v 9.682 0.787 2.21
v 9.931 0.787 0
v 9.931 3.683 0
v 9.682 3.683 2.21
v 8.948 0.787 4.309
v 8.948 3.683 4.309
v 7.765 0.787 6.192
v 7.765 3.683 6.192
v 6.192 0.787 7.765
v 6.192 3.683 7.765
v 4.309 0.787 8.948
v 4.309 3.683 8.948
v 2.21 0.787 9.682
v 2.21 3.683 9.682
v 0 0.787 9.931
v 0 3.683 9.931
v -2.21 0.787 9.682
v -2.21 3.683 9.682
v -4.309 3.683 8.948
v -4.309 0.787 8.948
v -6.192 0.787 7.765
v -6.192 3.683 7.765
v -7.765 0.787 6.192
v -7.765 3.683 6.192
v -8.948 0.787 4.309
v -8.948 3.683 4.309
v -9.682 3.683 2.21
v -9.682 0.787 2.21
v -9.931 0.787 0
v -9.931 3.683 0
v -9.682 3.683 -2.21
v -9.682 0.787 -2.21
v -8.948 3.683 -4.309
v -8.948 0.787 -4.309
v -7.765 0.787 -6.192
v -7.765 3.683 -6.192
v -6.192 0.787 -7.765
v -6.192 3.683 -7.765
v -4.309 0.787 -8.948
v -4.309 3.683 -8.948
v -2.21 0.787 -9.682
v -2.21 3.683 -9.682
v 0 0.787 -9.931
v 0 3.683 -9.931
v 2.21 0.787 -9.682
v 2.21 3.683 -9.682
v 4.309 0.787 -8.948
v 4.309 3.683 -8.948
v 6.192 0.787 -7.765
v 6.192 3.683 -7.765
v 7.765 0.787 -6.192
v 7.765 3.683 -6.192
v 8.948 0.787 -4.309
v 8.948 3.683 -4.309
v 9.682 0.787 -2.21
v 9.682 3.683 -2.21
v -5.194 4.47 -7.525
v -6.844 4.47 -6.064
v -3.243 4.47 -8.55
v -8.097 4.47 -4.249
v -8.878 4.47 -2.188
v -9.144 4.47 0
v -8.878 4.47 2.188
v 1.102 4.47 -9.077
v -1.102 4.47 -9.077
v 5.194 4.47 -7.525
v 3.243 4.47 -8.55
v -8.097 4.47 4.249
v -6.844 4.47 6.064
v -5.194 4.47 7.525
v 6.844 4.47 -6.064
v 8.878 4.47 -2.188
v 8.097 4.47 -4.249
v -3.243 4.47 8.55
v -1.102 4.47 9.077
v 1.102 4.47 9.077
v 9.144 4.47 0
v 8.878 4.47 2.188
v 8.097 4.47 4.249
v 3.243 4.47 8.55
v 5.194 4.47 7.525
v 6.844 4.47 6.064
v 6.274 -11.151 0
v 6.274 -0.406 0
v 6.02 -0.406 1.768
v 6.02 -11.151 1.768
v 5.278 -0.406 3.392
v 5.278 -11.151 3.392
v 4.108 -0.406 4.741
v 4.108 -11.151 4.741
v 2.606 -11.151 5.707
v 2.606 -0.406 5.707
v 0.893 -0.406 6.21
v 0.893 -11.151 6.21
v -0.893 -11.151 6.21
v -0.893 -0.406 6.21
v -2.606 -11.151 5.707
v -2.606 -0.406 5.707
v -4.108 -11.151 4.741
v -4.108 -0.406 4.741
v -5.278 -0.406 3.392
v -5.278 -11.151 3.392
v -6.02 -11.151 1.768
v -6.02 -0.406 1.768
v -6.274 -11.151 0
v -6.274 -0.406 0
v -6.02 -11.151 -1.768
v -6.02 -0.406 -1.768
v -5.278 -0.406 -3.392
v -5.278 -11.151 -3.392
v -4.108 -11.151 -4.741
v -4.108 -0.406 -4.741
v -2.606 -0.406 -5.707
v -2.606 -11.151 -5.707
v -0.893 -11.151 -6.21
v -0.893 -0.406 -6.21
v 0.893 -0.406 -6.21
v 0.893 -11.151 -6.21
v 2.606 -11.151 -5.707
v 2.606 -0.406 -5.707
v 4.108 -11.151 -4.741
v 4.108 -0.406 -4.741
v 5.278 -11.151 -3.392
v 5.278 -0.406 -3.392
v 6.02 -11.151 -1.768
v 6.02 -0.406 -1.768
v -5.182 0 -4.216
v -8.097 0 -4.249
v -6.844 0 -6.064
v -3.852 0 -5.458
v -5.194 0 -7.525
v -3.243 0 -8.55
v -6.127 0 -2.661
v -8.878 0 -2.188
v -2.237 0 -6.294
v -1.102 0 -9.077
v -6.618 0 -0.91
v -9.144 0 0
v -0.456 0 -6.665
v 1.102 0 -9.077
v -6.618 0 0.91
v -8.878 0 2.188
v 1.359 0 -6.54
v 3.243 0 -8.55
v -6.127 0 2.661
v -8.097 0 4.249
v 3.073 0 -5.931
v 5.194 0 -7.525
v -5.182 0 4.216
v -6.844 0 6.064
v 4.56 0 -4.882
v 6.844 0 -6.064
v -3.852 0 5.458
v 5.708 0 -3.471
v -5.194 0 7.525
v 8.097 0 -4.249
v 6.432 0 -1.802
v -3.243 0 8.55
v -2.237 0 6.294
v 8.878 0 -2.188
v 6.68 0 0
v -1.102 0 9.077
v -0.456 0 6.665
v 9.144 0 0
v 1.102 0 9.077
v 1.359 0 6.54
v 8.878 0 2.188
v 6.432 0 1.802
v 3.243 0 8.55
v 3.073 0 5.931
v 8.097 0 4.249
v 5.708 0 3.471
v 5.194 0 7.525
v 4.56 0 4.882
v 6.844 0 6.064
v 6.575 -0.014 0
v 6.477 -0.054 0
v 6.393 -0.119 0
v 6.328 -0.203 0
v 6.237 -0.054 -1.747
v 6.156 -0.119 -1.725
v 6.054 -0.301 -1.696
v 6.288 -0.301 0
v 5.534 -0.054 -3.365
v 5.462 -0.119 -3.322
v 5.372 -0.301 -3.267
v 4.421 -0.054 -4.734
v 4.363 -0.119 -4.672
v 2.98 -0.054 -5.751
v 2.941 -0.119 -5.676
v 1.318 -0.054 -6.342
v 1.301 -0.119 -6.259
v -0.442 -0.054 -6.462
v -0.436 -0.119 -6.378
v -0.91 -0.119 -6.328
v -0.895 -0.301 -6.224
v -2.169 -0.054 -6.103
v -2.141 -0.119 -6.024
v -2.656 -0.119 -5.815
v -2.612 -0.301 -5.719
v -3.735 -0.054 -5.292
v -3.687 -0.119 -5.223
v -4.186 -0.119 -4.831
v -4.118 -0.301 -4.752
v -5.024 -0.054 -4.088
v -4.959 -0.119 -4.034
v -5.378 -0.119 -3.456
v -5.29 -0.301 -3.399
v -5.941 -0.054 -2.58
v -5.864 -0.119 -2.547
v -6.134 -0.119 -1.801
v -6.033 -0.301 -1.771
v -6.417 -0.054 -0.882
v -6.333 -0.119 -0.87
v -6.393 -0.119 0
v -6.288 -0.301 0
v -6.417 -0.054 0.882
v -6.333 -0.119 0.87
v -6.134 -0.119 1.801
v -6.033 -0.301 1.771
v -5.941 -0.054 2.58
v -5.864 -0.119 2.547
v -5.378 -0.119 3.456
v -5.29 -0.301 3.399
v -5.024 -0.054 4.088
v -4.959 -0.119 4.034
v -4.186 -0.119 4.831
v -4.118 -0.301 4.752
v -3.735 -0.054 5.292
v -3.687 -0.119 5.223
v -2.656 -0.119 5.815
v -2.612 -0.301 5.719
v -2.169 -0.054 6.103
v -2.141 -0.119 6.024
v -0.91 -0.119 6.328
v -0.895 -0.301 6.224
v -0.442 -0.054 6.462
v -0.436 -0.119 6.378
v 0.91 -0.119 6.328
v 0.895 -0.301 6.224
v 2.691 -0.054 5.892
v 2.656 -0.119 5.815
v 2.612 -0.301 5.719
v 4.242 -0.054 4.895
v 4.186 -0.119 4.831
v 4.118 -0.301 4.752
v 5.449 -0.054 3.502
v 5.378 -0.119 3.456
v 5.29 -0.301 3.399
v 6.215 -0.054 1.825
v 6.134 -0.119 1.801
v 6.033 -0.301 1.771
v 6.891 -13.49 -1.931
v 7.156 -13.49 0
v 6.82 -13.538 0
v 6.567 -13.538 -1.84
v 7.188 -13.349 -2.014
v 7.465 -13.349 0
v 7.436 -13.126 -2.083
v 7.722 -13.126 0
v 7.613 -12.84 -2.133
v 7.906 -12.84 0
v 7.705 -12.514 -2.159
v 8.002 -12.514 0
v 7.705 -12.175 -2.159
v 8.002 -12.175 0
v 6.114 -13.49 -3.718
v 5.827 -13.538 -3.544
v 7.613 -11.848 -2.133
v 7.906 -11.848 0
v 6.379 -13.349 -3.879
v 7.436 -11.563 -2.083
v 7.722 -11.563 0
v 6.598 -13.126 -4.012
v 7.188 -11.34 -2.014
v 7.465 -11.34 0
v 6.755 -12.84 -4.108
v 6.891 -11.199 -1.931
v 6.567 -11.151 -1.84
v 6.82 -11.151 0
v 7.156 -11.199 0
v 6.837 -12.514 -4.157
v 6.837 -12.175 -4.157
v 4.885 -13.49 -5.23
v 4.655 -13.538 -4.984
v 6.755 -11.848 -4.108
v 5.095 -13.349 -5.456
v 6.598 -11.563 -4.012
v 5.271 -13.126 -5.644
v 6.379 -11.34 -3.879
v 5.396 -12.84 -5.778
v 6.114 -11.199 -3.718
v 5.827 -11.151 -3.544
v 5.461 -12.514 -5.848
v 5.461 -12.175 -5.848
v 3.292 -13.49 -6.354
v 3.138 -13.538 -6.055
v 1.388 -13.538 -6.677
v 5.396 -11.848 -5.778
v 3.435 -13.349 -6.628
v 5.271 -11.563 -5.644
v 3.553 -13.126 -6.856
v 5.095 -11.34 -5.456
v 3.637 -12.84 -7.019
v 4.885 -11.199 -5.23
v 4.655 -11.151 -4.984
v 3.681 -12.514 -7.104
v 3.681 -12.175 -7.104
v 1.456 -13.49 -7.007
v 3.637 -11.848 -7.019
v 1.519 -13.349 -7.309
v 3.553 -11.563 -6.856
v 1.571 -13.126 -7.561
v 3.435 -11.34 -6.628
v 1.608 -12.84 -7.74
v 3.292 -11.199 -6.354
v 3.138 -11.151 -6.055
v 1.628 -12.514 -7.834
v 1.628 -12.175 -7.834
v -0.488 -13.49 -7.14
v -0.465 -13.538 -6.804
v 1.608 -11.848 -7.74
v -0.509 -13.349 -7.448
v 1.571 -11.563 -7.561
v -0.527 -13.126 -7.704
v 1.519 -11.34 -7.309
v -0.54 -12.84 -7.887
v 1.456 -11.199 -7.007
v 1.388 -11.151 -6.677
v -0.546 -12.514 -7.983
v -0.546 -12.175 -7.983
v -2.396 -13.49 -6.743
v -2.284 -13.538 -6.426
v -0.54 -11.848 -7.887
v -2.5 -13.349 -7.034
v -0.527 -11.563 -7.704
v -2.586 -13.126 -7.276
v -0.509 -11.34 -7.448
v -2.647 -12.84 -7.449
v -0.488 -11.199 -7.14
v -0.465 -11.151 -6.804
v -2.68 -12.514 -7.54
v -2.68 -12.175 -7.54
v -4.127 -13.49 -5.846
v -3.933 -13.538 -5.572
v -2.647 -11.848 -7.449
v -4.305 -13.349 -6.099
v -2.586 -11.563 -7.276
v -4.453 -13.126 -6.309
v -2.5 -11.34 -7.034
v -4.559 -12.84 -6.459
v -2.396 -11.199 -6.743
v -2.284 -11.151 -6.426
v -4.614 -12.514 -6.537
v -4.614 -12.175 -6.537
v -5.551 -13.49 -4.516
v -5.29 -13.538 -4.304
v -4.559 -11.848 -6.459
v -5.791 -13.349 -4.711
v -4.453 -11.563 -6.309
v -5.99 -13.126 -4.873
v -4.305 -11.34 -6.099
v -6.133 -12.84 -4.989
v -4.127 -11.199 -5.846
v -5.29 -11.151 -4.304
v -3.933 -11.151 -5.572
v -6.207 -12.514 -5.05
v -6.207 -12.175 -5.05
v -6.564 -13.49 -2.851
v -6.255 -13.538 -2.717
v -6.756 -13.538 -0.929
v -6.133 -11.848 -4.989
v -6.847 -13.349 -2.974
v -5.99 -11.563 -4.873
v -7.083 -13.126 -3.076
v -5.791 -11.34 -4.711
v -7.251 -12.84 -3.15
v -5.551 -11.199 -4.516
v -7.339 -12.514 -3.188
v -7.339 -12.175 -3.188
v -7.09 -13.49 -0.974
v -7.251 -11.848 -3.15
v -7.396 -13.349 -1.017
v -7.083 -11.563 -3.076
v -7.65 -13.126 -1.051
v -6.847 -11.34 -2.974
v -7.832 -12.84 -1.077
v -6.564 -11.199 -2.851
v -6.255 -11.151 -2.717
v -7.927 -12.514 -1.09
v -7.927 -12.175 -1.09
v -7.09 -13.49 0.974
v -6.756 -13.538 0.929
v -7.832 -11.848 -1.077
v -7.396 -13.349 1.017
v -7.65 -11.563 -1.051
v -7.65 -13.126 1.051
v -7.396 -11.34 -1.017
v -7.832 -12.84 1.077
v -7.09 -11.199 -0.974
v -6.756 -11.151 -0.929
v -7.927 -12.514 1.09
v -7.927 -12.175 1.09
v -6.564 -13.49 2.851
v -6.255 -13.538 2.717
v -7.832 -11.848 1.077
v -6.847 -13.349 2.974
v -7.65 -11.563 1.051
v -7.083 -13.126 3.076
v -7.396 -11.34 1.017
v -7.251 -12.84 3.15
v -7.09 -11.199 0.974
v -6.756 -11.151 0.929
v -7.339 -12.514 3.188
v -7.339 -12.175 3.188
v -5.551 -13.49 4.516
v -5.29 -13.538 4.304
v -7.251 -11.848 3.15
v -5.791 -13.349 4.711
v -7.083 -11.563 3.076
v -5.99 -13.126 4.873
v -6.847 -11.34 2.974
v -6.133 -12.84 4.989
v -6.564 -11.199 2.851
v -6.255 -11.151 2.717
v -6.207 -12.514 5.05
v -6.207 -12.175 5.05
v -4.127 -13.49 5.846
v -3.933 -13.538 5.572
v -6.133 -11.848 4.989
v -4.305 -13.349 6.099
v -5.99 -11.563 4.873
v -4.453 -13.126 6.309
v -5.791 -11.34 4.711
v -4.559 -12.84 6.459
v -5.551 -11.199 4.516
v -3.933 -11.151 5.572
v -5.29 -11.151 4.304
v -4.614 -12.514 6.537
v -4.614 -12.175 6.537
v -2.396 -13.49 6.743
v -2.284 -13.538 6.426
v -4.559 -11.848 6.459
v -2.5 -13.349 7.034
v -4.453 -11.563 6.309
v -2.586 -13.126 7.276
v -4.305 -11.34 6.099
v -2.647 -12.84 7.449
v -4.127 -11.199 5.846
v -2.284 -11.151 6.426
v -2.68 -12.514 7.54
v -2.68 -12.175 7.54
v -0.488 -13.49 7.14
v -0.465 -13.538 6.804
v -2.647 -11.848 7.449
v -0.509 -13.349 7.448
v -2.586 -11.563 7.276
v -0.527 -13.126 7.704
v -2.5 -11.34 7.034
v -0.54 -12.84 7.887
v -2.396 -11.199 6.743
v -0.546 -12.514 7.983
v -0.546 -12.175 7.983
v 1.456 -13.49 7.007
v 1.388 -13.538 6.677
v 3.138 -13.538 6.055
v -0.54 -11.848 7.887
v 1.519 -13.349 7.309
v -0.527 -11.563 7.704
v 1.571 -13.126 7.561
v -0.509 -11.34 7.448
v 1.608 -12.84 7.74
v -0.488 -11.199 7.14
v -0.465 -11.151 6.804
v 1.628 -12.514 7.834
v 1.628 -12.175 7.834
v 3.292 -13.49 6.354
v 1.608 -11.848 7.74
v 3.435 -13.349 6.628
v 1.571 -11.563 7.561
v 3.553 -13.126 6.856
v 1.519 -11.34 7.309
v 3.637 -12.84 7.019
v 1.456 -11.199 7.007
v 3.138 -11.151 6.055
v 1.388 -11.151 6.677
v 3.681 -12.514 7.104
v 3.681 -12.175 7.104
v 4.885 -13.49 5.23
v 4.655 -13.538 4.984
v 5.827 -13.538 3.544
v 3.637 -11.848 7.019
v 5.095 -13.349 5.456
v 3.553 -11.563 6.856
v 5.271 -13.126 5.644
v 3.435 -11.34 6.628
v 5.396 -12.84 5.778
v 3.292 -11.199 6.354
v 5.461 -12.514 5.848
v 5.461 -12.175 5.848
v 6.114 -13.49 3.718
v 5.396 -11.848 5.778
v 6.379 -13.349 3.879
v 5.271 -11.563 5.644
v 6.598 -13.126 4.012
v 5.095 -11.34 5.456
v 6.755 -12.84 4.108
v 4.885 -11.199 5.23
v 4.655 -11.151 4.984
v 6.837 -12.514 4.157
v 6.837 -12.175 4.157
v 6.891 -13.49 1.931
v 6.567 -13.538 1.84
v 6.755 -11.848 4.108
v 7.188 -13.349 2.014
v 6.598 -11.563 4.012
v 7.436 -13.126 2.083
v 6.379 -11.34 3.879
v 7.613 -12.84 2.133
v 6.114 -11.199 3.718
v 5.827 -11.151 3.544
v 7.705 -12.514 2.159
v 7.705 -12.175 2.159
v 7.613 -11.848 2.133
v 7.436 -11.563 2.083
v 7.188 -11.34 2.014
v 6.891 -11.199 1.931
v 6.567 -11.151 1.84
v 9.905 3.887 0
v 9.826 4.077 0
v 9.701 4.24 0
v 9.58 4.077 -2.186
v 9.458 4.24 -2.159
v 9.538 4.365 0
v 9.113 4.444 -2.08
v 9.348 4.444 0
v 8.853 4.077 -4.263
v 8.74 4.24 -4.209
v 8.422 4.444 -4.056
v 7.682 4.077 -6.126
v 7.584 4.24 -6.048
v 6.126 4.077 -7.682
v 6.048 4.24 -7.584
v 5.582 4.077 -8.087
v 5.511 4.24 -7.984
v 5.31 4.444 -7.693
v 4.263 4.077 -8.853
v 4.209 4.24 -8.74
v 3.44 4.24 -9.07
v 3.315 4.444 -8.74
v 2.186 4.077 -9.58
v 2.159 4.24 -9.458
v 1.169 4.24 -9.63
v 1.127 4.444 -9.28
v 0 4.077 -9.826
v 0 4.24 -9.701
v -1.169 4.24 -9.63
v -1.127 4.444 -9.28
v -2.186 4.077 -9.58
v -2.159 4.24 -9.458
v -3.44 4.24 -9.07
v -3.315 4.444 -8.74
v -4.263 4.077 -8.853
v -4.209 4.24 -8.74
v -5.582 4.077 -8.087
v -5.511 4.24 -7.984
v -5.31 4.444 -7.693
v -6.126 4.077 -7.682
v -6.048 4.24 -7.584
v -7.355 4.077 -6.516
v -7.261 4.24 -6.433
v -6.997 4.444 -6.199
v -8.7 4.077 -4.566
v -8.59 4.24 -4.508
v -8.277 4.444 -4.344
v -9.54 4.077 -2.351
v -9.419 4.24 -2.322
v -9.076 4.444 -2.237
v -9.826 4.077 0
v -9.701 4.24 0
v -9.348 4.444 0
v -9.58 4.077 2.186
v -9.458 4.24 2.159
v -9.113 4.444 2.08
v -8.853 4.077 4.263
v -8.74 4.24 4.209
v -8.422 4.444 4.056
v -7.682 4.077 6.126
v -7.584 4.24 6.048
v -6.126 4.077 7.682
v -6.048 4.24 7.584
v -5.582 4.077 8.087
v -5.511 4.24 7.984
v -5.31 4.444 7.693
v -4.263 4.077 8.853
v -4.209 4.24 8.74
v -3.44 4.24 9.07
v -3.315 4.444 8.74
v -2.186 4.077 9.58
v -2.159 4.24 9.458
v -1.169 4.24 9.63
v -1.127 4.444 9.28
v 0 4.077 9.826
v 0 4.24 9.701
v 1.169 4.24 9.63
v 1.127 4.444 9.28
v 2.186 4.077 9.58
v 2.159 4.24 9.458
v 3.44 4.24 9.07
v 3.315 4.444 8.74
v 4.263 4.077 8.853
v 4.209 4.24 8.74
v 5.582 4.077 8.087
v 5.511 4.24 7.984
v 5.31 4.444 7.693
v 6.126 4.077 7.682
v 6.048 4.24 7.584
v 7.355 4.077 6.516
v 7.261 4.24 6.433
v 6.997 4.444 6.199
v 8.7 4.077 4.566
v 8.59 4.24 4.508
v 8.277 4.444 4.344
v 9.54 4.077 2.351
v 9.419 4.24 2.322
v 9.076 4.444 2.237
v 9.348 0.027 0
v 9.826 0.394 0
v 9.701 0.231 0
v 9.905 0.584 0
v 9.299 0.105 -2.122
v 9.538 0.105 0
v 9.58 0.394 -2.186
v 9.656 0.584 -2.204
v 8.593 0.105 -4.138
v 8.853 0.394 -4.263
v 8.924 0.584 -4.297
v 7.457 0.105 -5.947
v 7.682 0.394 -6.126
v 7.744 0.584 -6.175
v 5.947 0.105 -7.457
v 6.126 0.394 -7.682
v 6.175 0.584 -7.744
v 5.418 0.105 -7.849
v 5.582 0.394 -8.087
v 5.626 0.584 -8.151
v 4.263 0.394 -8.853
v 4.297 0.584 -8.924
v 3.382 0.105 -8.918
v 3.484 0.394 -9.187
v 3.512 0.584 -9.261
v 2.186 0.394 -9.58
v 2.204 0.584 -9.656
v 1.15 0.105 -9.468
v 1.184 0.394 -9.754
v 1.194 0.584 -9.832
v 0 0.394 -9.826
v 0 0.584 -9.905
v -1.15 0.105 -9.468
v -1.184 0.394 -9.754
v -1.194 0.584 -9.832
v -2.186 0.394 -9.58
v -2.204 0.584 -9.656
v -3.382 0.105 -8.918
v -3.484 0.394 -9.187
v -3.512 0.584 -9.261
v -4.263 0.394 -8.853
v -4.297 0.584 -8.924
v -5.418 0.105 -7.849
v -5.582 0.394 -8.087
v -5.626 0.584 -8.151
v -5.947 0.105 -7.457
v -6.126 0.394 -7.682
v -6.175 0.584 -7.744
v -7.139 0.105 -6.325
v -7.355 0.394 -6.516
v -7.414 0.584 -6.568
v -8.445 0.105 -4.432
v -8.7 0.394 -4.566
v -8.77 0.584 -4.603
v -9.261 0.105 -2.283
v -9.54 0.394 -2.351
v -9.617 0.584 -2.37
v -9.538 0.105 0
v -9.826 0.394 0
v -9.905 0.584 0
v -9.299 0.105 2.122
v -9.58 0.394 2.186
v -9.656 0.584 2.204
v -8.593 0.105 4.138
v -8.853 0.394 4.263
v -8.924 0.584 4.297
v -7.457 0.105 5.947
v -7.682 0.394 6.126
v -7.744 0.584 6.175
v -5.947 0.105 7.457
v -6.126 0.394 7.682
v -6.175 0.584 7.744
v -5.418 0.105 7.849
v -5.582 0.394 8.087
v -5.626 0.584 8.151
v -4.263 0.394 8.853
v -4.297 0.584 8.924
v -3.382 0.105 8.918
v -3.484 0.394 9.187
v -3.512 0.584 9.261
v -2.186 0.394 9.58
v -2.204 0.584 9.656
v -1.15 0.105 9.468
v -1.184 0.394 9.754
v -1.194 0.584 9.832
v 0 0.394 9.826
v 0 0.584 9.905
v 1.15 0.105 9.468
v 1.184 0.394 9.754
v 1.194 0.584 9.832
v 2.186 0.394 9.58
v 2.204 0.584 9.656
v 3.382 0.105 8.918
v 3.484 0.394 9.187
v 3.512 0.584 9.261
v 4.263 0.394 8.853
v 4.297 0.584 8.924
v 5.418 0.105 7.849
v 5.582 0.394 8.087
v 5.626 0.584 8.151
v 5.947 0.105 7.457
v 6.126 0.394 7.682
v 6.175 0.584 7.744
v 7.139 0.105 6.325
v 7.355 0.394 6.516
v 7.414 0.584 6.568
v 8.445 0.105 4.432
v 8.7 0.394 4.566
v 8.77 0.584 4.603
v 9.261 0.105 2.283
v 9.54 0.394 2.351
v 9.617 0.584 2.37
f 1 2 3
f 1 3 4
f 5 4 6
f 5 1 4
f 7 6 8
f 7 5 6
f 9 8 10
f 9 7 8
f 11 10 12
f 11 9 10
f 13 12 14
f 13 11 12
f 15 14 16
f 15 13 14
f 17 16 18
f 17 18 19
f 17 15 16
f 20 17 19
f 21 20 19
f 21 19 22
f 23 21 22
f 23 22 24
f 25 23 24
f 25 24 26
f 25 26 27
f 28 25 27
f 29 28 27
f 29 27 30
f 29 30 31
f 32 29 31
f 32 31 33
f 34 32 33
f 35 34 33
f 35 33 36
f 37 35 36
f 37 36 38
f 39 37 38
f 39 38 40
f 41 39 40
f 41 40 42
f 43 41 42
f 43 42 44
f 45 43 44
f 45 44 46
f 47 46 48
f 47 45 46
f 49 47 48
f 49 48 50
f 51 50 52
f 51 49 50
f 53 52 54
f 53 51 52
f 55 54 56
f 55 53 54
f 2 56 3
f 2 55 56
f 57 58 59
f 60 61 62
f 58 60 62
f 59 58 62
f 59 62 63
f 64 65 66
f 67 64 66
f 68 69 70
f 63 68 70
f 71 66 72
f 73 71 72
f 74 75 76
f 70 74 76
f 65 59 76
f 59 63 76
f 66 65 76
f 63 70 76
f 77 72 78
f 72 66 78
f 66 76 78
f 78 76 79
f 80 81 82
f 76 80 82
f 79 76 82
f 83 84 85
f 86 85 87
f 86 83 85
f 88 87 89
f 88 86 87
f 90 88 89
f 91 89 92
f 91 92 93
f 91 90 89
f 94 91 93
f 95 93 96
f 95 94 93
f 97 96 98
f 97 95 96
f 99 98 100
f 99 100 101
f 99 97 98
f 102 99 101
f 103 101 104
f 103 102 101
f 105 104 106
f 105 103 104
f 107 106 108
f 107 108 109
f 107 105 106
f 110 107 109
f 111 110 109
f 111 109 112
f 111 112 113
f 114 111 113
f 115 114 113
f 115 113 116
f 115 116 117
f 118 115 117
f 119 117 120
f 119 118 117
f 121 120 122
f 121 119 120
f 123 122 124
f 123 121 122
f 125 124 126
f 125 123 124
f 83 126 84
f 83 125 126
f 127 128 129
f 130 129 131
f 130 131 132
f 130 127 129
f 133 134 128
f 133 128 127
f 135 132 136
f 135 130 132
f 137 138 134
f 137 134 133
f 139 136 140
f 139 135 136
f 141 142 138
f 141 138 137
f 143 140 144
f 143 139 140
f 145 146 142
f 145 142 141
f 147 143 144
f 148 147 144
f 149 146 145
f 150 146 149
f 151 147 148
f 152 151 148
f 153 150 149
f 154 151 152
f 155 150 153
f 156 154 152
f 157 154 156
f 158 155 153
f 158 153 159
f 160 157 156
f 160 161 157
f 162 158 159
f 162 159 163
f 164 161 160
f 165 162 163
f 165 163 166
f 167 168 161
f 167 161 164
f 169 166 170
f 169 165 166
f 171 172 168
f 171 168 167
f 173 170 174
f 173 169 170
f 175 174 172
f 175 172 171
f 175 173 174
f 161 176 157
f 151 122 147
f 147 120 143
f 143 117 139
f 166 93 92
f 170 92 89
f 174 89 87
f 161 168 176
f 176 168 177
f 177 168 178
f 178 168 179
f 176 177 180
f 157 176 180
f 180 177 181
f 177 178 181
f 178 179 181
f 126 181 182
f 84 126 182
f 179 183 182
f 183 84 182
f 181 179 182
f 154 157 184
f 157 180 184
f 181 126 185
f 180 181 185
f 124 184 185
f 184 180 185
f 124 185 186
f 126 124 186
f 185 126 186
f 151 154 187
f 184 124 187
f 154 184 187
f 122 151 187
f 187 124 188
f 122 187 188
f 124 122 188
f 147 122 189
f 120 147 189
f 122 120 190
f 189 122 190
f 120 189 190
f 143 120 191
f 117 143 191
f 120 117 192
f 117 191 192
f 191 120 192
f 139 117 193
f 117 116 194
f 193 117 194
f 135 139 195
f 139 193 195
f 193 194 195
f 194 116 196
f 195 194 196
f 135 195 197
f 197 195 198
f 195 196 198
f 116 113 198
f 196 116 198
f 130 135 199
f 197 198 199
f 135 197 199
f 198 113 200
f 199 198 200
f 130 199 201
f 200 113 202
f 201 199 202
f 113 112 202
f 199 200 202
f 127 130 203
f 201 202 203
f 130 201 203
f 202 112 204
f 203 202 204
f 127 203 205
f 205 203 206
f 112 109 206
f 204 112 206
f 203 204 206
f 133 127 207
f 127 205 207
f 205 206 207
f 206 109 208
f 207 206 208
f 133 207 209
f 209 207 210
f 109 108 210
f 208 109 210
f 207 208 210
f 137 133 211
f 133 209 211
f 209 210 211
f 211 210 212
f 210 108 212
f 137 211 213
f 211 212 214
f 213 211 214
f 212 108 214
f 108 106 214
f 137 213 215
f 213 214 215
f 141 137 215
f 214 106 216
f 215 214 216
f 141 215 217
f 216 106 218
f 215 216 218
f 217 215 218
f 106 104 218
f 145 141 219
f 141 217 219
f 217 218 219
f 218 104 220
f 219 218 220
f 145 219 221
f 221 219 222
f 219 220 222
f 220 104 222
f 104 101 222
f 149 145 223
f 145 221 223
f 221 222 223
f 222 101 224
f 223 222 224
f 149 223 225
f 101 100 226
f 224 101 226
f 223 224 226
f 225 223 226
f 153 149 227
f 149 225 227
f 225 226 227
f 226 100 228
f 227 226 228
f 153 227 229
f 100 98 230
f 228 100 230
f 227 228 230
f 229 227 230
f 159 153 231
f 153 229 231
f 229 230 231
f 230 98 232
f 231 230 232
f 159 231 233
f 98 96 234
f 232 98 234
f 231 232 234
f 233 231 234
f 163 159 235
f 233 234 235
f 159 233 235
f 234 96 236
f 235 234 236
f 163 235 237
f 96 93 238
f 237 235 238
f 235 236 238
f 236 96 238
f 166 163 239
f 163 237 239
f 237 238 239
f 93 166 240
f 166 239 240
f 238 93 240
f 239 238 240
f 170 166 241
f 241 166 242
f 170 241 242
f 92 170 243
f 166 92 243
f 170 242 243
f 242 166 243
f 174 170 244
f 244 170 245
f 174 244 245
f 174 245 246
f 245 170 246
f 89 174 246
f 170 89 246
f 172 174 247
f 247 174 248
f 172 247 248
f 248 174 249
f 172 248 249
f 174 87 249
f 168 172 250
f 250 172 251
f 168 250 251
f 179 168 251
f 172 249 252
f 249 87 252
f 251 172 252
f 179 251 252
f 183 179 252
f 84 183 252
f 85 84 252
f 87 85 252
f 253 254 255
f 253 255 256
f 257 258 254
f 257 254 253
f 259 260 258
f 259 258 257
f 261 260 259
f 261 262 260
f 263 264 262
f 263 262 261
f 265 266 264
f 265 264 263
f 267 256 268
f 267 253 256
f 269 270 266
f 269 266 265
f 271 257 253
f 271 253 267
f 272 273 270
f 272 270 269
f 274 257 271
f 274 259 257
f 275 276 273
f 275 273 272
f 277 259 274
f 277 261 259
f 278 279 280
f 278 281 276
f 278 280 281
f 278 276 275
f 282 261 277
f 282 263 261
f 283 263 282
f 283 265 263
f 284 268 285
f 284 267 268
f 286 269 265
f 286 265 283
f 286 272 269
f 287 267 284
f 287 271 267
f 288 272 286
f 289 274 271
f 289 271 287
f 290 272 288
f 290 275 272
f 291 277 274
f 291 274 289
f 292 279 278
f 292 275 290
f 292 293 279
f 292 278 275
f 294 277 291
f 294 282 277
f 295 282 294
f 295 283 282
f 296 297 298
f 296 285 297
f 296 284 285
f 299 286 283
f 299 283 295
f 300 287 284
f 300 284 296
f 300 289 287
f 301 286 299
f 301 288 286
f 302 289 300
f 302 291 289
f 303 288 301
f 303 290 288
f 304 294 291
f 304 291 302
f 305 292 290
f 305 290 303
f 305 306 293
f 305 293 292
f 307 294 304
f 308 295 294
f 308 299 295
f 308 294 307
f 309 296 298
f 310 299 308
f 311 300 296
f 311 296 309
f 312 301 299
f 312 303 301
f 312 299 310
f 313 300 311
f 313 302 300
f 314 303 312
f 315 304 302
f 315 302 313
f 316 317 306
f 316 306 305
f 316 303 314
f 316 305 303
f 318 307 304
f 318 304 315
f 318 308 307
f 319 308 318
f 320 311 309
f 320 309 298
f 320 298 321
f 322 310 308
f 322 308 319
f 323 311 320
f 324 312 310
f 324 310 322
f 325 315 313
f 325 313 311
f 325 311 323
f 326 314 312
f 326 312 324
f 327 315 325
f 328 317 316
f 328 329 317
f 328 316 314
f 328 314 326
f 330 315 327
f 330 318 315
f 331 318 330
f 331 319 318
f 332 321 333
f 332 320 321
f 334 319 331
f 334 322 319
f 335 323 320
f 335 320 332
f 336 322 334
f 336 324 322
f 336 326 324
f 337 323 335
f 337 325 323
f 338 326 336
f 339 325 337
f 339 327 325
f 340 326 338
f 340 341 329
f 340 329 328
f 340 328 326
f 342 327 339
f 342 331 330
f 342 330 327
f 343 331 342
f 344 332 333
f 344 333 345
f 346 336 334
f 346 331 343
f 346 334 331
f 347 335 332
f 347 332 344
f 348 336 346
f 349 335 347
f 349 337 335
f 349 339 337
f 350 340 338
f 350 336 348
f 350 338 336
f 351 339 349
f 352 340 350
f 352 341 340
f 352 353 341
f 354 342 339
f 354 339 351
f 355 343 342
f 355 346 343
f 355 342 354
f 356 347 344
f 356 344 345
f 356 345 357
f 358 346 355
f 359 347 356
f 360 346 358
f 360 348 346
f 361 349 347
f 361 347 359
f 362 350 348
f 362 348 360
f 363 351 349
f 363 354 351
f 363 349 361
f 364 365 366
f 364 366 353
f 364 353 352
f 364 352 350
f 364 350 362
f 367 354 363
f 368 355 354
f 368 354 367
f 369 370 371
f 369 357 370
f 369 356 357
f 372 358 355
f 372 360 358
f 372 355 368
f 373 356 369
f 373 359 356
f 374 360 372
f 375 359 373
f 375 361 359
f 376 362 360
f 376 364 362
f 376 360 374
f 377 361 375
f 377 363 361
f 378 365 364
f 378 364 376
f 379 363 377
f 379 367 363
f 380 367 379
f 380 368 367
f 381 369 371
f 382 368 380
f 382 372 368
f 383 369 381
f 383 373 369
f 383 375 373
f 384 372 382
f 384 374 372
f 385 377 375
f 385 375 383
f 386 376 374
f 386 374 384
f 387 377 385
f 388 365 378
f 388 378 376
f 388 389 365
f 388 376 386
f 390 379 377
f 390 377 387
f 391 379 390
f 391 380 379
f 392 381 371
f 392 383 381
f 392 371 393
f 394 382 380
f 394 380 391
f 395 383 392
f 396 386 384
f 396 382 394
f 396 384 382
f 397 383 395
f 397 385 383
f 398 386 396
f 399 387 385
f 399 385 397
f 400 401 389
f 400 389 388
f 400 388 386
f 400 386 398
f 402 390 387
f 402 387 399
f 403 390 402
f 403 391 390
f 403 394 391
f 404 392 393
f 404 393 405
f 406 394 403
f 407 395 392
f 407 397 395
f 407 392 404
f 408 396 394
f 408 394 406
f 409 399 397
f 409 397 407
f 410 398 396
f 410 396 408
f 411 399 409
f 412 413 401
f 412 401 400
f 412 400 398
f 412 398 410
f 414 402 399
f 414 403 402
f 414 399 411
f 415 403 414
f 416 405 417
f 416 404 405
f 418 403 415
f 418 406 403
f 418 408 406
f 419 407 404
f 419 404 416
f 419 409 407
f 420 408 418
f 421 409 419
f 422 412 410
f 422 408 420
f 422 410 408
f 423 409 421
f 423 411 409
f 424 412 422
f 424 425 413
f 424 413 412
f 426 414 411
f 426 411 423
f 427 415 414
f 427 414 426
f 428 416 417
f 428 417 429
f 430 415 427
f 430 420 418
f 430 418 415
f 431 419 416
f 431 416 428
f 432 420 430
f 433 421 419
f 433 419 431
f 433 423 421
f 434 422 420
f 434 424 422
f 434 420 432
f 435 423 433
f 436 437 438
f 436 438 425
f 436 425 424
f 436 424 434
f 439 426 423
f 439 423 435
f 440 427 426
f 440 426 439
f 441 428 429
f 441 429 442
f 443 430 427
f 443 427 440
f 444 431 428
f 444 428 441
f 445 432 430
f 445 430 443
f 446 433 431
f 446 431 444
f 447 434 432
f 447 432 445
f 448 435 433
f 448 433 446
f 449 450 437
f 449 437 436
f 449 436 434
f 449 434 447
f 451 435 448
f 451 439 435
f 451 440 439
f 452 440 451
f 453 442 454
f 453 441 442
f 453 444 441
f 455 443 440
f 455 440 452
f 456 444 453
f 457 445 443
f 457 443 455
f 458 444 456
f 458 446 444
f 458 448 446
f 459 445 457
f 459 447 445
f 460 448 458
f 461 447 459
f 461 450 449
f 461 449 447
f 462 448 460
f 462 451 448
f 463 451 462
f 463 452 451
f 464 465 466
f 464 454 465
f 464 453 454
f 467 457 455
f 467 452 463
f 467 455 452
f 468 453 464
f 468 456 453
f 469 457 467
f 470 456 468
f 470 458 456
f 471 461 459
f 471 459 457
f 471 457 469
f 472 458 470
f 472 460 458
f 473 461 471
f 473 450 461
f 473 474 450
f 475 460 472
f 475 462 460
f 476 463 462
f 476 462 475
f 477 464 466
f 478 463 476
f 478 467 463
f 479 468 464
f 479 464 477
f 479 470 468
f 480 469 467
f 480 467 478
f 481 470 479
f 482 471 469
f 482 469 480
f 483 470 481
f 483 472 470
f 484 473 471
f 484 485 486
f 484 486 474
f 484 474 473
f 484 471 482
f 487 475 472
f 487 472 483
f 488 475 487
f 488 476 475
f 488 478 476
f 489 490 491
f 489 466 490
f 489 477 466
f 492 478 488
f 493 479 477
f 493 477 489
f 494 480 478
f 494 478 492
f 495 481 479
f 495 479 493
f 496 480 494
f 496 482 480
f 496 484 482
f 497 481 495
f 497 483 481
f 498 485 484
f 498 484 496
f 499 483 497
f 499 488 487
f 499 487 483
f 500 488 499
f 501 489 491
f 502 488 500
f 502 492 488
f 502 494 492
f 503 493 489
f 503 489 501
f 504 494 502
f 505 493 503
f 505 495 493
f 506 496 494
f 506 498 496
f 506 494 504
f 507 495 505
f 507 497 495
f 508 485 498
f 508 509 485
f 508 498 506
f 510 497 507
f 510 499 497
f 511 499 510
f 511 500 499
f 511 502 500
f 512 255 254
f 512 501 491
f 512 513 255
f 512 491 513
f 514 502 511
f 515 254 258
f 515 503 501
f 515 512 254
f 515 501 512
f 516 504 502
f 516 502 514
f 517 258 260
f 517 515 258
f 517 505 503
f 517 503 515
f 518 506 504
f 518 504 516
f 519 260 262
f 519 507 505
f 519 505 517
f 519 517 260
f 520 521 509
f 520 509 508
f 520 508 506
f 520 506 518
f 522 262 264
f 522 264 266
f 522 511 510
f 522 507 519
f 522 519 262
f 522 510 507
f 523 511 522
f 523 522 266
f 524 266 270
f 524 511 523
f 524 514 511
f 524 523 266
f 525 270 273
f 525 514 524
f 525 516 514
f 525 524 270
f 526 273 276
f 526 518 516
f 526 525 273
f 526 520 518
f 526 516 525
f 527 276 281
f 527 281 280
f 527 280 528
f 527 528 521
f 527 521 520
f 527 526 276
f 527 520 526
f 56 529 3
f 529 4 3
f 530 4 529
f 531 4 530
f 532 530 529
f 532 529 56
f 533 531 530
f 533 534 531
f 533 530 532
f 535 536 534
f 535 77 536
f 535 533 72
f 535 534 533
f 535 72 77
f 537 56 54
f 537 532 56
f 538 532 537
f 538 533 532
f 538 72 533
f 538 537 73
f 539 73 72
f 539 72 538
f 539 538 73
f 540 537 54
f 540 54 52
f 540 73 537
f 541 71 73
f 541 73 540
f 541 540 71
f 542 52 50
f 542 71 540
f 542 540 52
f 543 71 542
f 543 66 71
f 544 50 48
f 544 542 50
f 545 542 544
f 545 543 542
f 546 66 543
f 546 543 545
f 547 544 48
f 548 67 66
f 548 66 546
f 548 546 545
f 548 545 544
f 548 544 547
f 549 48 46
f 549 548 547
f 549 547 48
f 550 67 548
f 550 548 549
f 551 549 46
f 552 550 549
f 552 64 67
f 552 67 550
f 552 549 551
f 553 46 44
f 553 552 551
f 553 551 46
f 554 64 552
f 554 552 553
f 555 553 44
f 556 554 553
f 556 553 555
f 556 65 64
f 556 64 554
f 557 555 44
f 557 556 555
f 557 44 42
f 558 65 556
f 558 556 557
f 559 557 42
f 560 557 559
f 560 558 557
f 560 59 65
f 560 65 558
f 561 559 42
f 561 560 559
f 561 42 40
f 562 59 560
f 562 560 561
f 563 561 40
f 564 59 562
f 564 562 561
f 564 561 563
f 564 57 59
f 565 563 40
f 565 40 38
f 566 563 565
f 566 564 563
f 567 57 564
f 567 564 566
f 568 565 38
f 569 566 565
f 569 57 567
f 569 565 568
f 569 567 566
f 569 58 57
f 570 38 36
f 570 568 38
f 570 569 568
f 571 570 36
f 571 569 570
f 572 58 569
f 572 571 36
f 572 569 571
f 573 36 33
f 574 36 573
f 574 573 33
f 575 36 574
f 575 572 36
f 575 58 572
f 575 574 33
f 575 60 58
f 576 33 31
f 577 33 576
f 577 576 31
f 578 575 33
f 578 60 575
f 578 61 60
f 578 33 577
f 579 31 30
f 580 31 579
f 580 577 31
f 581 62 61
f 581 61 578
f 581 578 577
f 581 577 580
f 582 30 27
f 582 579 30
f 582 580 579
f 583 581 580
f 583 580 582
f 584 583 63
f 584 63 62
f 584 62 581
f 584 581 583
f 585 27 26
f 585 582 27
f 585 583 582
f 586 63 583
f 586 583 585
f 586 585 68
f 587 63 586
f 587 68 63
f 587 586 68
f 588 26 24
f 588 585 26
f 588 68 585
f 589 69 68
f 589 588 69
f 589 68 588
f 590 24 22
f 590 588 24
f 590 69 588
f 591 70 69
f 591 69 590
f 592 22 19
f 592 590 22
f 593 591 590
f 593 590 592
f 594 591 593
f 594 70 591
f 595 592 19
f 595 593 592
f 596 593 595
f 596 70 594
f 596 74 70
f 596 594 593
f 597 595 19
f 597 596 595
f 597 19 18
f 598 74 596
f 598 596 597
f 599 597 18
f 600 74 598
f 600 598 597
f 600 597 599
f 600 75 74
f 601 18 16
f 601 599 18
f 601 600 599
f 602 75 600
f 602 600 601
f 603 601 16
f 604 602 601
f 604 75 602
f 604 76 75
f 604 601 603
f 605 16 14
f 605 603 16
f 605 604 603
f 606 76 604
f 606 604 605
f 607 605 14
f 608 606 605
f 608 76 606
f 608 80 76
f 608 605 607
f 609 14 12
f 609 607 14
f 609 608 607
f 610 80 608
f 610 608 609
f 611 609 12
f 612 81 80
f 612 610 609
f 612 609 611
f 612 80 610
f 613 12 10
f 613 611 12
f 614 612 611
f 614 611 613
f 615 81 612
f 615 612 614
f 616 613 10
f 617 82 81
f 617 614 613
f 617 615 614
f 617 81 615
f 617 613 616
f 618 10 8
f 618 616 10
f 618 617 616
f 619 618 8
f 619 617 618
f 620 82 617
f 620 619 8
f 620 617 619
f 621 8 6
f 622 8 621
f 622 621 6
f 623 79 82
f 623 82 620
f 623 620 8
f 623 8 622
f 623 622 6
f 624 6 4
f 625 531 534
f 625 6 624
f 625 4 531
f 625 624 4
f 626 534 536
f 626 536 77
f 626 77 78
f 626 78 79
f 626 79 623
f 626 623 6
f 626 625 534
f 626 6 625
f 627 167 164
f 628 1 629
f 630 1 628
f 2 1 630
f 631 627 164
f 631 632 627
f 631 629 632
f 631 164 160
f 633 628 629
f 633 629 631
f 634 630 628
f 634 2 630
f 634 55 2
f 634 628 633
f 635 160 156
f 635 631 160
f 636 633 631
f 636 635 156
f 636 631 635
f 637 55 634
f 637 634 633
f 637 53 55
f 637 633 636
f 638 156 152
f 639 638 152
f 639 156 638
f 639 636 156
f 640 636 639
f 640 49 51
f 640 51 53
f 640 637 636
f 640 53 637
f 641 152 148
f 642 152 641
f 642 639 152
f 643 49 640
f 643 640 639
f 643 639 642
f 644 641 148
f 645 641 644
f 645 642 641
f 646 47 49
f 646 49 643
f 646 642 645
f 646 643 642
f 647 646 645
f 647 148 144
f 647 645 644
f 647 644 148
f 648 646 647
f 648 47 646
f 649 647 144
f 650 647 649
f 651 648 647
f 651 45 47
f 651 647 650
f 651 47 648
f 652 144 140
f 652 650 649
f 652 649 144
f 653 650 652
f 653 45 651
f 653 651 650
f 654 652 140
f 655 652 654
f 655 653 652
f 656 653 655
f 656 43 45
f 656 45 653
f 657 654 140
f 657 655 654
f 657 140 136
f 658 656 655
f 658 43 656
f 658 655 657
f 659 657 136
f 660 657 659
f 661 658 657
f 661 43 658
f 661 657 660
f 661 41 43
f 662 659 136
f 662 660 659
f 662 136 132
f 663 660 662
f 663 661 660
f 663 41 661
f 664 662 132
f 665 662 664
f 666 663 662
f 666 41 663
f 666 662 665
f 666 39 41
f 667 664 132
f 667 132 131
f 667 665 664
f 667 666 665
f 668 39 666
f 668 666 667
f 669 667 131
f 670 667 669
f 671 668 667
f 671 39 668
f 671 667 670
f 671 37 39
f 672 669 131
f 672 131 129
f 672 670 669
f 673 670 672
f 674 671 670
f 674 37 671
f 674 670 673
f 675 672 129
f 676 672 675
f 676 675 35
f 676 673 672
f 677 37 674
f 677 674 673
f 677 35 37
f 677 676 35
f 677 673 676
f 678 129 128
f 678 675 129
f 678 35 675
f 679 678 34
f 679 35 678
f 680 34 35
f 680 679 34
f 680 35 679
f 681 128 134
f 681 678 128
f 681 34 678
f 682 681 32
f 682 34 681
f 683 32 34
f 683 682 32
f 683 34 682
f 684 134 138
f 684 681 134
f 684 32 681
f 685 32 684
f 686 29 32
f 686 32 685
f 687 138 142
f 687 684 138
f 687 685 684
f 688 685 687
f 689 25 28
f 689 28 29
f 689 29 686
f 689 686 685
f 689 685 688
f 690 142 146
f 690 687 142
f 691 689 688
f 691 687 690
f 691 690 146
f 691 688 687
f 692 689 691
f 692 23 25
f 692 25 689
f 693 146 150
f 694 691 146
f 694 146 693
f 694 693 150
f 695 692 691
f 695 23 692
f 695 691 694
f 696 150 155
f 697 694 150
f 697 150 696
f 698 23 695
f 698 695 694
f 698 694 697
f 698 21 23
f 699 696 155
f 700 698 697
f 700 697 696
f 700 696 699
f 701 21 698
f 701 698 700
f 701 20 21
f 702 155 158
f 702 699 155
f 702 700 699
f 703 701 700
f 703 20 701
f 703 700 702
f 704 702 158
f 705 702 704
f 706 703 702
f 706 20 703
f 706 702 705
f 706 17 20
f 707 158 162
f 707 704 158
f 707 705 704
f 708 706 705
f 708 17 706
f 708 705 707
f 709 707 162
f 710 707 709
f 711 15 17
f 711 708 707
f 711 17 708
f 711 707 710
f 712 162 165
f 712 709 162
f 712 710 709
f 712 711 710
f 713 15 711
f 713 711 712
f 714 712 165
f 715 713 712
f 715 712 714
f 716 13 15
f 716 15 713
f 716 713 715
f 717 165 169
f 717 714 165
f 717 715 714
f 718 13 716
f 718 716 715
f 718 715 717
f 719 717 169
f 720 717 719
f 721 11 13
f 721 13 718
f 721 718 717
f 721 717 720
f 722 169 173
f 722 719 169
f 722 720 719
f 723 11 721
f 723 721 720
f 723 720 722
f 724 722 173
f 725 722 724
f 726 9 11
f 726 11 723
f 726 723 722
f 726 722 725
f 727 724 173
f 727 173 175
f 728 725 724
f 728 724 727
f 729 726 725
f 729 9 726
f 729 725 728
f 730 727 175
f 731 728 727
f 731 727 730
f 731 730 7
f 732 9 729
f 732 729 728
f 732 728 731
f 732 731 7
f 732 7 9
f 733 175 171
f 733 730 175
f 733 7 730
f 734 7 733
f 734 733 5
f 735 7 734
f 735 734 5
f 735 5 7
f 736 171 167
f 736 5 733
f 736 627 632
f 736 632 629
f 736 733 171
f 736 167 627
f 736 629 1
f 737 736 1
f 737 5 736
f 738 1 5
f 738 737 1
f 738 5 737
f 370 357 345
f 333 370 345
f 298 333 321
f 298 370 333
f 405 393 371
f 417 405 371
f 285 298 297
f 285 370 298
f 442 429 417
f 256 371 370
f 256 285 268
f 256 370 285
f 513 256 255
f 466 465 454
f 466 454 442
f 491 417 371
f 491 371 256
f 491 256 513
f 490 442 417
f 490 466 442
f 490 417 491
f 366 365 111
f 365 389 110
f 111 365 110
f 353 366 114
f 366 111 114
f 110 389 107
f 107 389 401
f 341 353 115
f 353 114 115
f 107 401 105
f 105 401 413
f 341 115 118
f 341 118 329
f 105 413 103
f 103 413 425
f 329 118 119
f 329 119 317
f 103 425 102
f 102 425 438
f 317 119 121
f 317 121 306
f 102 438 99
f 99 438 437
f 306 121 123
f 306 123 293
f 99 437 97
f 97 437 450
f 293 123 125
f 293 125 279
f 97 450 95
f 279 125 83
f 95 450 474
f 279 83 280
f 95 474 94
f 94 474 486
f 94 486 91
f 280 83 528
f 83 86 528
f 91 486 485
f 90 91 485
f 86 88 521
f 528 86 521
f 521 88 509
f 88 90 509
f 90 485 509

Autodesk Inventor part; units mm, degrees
sketch "Sketch_1" plane through (0, 0, 0) normal (0, 0, 1) x (1, 0, 0)
  line L0 (0, -13.5382) -> (0, 4.4704)
  line L1 (0, 4.4704) -> (9.144, 4.4704)
  arc A0 (9.9314, 3.683) -> (9.144, 4.4704) centre (9.144, 3.683) ccw
  line L2 (9.9314, 3.683) -> (9.9314, 0.7874)
  arc A1 (9.144, 0) -> (9.9314, 0.7874) centre (9.144, 0.7874) ccw
  line L3 (9.144, 0) -> (6.6802, 0)
  arc A2 (6.6802, 0) -> (6.2738, -0.4064) centre (6.6802, -0.4064) ccw
  line L4 (6.2738, -0.4064) -> (6.2738, -11.1506)
  line L5 (6.2738, -11.1506) -> (6.8199, -11.1506)
  arc A3 (6.8199, -13.5382) -> (6.8199, -11.1506) centre (6.8199, -12.3444) ccw
  line L6 (6.8199, -13.5382) -> (0, -13.5382)
  line L7 (0, -13.5382) -> (0, 4.4704)
revolve "Revolution1" add sketch "Sketch_1" angle 360 about axis through (0, -13.5382, 0) along (0, -1, 0)
ref_plane "plate_rivet_XY" through (0, 0, 0) normal (0, -1, 0) x (1, 0, 0)
ref_plane "plate_rivet_YZ" through (0, 0, 0) normal (1, 0, 0) x (0, 0, 1)
ref_plane "plate_rivet_ZX" through (0, 0, 0) normal (0, 0, 1) x (0, -1, 0)
properties part number "2SS-R"
